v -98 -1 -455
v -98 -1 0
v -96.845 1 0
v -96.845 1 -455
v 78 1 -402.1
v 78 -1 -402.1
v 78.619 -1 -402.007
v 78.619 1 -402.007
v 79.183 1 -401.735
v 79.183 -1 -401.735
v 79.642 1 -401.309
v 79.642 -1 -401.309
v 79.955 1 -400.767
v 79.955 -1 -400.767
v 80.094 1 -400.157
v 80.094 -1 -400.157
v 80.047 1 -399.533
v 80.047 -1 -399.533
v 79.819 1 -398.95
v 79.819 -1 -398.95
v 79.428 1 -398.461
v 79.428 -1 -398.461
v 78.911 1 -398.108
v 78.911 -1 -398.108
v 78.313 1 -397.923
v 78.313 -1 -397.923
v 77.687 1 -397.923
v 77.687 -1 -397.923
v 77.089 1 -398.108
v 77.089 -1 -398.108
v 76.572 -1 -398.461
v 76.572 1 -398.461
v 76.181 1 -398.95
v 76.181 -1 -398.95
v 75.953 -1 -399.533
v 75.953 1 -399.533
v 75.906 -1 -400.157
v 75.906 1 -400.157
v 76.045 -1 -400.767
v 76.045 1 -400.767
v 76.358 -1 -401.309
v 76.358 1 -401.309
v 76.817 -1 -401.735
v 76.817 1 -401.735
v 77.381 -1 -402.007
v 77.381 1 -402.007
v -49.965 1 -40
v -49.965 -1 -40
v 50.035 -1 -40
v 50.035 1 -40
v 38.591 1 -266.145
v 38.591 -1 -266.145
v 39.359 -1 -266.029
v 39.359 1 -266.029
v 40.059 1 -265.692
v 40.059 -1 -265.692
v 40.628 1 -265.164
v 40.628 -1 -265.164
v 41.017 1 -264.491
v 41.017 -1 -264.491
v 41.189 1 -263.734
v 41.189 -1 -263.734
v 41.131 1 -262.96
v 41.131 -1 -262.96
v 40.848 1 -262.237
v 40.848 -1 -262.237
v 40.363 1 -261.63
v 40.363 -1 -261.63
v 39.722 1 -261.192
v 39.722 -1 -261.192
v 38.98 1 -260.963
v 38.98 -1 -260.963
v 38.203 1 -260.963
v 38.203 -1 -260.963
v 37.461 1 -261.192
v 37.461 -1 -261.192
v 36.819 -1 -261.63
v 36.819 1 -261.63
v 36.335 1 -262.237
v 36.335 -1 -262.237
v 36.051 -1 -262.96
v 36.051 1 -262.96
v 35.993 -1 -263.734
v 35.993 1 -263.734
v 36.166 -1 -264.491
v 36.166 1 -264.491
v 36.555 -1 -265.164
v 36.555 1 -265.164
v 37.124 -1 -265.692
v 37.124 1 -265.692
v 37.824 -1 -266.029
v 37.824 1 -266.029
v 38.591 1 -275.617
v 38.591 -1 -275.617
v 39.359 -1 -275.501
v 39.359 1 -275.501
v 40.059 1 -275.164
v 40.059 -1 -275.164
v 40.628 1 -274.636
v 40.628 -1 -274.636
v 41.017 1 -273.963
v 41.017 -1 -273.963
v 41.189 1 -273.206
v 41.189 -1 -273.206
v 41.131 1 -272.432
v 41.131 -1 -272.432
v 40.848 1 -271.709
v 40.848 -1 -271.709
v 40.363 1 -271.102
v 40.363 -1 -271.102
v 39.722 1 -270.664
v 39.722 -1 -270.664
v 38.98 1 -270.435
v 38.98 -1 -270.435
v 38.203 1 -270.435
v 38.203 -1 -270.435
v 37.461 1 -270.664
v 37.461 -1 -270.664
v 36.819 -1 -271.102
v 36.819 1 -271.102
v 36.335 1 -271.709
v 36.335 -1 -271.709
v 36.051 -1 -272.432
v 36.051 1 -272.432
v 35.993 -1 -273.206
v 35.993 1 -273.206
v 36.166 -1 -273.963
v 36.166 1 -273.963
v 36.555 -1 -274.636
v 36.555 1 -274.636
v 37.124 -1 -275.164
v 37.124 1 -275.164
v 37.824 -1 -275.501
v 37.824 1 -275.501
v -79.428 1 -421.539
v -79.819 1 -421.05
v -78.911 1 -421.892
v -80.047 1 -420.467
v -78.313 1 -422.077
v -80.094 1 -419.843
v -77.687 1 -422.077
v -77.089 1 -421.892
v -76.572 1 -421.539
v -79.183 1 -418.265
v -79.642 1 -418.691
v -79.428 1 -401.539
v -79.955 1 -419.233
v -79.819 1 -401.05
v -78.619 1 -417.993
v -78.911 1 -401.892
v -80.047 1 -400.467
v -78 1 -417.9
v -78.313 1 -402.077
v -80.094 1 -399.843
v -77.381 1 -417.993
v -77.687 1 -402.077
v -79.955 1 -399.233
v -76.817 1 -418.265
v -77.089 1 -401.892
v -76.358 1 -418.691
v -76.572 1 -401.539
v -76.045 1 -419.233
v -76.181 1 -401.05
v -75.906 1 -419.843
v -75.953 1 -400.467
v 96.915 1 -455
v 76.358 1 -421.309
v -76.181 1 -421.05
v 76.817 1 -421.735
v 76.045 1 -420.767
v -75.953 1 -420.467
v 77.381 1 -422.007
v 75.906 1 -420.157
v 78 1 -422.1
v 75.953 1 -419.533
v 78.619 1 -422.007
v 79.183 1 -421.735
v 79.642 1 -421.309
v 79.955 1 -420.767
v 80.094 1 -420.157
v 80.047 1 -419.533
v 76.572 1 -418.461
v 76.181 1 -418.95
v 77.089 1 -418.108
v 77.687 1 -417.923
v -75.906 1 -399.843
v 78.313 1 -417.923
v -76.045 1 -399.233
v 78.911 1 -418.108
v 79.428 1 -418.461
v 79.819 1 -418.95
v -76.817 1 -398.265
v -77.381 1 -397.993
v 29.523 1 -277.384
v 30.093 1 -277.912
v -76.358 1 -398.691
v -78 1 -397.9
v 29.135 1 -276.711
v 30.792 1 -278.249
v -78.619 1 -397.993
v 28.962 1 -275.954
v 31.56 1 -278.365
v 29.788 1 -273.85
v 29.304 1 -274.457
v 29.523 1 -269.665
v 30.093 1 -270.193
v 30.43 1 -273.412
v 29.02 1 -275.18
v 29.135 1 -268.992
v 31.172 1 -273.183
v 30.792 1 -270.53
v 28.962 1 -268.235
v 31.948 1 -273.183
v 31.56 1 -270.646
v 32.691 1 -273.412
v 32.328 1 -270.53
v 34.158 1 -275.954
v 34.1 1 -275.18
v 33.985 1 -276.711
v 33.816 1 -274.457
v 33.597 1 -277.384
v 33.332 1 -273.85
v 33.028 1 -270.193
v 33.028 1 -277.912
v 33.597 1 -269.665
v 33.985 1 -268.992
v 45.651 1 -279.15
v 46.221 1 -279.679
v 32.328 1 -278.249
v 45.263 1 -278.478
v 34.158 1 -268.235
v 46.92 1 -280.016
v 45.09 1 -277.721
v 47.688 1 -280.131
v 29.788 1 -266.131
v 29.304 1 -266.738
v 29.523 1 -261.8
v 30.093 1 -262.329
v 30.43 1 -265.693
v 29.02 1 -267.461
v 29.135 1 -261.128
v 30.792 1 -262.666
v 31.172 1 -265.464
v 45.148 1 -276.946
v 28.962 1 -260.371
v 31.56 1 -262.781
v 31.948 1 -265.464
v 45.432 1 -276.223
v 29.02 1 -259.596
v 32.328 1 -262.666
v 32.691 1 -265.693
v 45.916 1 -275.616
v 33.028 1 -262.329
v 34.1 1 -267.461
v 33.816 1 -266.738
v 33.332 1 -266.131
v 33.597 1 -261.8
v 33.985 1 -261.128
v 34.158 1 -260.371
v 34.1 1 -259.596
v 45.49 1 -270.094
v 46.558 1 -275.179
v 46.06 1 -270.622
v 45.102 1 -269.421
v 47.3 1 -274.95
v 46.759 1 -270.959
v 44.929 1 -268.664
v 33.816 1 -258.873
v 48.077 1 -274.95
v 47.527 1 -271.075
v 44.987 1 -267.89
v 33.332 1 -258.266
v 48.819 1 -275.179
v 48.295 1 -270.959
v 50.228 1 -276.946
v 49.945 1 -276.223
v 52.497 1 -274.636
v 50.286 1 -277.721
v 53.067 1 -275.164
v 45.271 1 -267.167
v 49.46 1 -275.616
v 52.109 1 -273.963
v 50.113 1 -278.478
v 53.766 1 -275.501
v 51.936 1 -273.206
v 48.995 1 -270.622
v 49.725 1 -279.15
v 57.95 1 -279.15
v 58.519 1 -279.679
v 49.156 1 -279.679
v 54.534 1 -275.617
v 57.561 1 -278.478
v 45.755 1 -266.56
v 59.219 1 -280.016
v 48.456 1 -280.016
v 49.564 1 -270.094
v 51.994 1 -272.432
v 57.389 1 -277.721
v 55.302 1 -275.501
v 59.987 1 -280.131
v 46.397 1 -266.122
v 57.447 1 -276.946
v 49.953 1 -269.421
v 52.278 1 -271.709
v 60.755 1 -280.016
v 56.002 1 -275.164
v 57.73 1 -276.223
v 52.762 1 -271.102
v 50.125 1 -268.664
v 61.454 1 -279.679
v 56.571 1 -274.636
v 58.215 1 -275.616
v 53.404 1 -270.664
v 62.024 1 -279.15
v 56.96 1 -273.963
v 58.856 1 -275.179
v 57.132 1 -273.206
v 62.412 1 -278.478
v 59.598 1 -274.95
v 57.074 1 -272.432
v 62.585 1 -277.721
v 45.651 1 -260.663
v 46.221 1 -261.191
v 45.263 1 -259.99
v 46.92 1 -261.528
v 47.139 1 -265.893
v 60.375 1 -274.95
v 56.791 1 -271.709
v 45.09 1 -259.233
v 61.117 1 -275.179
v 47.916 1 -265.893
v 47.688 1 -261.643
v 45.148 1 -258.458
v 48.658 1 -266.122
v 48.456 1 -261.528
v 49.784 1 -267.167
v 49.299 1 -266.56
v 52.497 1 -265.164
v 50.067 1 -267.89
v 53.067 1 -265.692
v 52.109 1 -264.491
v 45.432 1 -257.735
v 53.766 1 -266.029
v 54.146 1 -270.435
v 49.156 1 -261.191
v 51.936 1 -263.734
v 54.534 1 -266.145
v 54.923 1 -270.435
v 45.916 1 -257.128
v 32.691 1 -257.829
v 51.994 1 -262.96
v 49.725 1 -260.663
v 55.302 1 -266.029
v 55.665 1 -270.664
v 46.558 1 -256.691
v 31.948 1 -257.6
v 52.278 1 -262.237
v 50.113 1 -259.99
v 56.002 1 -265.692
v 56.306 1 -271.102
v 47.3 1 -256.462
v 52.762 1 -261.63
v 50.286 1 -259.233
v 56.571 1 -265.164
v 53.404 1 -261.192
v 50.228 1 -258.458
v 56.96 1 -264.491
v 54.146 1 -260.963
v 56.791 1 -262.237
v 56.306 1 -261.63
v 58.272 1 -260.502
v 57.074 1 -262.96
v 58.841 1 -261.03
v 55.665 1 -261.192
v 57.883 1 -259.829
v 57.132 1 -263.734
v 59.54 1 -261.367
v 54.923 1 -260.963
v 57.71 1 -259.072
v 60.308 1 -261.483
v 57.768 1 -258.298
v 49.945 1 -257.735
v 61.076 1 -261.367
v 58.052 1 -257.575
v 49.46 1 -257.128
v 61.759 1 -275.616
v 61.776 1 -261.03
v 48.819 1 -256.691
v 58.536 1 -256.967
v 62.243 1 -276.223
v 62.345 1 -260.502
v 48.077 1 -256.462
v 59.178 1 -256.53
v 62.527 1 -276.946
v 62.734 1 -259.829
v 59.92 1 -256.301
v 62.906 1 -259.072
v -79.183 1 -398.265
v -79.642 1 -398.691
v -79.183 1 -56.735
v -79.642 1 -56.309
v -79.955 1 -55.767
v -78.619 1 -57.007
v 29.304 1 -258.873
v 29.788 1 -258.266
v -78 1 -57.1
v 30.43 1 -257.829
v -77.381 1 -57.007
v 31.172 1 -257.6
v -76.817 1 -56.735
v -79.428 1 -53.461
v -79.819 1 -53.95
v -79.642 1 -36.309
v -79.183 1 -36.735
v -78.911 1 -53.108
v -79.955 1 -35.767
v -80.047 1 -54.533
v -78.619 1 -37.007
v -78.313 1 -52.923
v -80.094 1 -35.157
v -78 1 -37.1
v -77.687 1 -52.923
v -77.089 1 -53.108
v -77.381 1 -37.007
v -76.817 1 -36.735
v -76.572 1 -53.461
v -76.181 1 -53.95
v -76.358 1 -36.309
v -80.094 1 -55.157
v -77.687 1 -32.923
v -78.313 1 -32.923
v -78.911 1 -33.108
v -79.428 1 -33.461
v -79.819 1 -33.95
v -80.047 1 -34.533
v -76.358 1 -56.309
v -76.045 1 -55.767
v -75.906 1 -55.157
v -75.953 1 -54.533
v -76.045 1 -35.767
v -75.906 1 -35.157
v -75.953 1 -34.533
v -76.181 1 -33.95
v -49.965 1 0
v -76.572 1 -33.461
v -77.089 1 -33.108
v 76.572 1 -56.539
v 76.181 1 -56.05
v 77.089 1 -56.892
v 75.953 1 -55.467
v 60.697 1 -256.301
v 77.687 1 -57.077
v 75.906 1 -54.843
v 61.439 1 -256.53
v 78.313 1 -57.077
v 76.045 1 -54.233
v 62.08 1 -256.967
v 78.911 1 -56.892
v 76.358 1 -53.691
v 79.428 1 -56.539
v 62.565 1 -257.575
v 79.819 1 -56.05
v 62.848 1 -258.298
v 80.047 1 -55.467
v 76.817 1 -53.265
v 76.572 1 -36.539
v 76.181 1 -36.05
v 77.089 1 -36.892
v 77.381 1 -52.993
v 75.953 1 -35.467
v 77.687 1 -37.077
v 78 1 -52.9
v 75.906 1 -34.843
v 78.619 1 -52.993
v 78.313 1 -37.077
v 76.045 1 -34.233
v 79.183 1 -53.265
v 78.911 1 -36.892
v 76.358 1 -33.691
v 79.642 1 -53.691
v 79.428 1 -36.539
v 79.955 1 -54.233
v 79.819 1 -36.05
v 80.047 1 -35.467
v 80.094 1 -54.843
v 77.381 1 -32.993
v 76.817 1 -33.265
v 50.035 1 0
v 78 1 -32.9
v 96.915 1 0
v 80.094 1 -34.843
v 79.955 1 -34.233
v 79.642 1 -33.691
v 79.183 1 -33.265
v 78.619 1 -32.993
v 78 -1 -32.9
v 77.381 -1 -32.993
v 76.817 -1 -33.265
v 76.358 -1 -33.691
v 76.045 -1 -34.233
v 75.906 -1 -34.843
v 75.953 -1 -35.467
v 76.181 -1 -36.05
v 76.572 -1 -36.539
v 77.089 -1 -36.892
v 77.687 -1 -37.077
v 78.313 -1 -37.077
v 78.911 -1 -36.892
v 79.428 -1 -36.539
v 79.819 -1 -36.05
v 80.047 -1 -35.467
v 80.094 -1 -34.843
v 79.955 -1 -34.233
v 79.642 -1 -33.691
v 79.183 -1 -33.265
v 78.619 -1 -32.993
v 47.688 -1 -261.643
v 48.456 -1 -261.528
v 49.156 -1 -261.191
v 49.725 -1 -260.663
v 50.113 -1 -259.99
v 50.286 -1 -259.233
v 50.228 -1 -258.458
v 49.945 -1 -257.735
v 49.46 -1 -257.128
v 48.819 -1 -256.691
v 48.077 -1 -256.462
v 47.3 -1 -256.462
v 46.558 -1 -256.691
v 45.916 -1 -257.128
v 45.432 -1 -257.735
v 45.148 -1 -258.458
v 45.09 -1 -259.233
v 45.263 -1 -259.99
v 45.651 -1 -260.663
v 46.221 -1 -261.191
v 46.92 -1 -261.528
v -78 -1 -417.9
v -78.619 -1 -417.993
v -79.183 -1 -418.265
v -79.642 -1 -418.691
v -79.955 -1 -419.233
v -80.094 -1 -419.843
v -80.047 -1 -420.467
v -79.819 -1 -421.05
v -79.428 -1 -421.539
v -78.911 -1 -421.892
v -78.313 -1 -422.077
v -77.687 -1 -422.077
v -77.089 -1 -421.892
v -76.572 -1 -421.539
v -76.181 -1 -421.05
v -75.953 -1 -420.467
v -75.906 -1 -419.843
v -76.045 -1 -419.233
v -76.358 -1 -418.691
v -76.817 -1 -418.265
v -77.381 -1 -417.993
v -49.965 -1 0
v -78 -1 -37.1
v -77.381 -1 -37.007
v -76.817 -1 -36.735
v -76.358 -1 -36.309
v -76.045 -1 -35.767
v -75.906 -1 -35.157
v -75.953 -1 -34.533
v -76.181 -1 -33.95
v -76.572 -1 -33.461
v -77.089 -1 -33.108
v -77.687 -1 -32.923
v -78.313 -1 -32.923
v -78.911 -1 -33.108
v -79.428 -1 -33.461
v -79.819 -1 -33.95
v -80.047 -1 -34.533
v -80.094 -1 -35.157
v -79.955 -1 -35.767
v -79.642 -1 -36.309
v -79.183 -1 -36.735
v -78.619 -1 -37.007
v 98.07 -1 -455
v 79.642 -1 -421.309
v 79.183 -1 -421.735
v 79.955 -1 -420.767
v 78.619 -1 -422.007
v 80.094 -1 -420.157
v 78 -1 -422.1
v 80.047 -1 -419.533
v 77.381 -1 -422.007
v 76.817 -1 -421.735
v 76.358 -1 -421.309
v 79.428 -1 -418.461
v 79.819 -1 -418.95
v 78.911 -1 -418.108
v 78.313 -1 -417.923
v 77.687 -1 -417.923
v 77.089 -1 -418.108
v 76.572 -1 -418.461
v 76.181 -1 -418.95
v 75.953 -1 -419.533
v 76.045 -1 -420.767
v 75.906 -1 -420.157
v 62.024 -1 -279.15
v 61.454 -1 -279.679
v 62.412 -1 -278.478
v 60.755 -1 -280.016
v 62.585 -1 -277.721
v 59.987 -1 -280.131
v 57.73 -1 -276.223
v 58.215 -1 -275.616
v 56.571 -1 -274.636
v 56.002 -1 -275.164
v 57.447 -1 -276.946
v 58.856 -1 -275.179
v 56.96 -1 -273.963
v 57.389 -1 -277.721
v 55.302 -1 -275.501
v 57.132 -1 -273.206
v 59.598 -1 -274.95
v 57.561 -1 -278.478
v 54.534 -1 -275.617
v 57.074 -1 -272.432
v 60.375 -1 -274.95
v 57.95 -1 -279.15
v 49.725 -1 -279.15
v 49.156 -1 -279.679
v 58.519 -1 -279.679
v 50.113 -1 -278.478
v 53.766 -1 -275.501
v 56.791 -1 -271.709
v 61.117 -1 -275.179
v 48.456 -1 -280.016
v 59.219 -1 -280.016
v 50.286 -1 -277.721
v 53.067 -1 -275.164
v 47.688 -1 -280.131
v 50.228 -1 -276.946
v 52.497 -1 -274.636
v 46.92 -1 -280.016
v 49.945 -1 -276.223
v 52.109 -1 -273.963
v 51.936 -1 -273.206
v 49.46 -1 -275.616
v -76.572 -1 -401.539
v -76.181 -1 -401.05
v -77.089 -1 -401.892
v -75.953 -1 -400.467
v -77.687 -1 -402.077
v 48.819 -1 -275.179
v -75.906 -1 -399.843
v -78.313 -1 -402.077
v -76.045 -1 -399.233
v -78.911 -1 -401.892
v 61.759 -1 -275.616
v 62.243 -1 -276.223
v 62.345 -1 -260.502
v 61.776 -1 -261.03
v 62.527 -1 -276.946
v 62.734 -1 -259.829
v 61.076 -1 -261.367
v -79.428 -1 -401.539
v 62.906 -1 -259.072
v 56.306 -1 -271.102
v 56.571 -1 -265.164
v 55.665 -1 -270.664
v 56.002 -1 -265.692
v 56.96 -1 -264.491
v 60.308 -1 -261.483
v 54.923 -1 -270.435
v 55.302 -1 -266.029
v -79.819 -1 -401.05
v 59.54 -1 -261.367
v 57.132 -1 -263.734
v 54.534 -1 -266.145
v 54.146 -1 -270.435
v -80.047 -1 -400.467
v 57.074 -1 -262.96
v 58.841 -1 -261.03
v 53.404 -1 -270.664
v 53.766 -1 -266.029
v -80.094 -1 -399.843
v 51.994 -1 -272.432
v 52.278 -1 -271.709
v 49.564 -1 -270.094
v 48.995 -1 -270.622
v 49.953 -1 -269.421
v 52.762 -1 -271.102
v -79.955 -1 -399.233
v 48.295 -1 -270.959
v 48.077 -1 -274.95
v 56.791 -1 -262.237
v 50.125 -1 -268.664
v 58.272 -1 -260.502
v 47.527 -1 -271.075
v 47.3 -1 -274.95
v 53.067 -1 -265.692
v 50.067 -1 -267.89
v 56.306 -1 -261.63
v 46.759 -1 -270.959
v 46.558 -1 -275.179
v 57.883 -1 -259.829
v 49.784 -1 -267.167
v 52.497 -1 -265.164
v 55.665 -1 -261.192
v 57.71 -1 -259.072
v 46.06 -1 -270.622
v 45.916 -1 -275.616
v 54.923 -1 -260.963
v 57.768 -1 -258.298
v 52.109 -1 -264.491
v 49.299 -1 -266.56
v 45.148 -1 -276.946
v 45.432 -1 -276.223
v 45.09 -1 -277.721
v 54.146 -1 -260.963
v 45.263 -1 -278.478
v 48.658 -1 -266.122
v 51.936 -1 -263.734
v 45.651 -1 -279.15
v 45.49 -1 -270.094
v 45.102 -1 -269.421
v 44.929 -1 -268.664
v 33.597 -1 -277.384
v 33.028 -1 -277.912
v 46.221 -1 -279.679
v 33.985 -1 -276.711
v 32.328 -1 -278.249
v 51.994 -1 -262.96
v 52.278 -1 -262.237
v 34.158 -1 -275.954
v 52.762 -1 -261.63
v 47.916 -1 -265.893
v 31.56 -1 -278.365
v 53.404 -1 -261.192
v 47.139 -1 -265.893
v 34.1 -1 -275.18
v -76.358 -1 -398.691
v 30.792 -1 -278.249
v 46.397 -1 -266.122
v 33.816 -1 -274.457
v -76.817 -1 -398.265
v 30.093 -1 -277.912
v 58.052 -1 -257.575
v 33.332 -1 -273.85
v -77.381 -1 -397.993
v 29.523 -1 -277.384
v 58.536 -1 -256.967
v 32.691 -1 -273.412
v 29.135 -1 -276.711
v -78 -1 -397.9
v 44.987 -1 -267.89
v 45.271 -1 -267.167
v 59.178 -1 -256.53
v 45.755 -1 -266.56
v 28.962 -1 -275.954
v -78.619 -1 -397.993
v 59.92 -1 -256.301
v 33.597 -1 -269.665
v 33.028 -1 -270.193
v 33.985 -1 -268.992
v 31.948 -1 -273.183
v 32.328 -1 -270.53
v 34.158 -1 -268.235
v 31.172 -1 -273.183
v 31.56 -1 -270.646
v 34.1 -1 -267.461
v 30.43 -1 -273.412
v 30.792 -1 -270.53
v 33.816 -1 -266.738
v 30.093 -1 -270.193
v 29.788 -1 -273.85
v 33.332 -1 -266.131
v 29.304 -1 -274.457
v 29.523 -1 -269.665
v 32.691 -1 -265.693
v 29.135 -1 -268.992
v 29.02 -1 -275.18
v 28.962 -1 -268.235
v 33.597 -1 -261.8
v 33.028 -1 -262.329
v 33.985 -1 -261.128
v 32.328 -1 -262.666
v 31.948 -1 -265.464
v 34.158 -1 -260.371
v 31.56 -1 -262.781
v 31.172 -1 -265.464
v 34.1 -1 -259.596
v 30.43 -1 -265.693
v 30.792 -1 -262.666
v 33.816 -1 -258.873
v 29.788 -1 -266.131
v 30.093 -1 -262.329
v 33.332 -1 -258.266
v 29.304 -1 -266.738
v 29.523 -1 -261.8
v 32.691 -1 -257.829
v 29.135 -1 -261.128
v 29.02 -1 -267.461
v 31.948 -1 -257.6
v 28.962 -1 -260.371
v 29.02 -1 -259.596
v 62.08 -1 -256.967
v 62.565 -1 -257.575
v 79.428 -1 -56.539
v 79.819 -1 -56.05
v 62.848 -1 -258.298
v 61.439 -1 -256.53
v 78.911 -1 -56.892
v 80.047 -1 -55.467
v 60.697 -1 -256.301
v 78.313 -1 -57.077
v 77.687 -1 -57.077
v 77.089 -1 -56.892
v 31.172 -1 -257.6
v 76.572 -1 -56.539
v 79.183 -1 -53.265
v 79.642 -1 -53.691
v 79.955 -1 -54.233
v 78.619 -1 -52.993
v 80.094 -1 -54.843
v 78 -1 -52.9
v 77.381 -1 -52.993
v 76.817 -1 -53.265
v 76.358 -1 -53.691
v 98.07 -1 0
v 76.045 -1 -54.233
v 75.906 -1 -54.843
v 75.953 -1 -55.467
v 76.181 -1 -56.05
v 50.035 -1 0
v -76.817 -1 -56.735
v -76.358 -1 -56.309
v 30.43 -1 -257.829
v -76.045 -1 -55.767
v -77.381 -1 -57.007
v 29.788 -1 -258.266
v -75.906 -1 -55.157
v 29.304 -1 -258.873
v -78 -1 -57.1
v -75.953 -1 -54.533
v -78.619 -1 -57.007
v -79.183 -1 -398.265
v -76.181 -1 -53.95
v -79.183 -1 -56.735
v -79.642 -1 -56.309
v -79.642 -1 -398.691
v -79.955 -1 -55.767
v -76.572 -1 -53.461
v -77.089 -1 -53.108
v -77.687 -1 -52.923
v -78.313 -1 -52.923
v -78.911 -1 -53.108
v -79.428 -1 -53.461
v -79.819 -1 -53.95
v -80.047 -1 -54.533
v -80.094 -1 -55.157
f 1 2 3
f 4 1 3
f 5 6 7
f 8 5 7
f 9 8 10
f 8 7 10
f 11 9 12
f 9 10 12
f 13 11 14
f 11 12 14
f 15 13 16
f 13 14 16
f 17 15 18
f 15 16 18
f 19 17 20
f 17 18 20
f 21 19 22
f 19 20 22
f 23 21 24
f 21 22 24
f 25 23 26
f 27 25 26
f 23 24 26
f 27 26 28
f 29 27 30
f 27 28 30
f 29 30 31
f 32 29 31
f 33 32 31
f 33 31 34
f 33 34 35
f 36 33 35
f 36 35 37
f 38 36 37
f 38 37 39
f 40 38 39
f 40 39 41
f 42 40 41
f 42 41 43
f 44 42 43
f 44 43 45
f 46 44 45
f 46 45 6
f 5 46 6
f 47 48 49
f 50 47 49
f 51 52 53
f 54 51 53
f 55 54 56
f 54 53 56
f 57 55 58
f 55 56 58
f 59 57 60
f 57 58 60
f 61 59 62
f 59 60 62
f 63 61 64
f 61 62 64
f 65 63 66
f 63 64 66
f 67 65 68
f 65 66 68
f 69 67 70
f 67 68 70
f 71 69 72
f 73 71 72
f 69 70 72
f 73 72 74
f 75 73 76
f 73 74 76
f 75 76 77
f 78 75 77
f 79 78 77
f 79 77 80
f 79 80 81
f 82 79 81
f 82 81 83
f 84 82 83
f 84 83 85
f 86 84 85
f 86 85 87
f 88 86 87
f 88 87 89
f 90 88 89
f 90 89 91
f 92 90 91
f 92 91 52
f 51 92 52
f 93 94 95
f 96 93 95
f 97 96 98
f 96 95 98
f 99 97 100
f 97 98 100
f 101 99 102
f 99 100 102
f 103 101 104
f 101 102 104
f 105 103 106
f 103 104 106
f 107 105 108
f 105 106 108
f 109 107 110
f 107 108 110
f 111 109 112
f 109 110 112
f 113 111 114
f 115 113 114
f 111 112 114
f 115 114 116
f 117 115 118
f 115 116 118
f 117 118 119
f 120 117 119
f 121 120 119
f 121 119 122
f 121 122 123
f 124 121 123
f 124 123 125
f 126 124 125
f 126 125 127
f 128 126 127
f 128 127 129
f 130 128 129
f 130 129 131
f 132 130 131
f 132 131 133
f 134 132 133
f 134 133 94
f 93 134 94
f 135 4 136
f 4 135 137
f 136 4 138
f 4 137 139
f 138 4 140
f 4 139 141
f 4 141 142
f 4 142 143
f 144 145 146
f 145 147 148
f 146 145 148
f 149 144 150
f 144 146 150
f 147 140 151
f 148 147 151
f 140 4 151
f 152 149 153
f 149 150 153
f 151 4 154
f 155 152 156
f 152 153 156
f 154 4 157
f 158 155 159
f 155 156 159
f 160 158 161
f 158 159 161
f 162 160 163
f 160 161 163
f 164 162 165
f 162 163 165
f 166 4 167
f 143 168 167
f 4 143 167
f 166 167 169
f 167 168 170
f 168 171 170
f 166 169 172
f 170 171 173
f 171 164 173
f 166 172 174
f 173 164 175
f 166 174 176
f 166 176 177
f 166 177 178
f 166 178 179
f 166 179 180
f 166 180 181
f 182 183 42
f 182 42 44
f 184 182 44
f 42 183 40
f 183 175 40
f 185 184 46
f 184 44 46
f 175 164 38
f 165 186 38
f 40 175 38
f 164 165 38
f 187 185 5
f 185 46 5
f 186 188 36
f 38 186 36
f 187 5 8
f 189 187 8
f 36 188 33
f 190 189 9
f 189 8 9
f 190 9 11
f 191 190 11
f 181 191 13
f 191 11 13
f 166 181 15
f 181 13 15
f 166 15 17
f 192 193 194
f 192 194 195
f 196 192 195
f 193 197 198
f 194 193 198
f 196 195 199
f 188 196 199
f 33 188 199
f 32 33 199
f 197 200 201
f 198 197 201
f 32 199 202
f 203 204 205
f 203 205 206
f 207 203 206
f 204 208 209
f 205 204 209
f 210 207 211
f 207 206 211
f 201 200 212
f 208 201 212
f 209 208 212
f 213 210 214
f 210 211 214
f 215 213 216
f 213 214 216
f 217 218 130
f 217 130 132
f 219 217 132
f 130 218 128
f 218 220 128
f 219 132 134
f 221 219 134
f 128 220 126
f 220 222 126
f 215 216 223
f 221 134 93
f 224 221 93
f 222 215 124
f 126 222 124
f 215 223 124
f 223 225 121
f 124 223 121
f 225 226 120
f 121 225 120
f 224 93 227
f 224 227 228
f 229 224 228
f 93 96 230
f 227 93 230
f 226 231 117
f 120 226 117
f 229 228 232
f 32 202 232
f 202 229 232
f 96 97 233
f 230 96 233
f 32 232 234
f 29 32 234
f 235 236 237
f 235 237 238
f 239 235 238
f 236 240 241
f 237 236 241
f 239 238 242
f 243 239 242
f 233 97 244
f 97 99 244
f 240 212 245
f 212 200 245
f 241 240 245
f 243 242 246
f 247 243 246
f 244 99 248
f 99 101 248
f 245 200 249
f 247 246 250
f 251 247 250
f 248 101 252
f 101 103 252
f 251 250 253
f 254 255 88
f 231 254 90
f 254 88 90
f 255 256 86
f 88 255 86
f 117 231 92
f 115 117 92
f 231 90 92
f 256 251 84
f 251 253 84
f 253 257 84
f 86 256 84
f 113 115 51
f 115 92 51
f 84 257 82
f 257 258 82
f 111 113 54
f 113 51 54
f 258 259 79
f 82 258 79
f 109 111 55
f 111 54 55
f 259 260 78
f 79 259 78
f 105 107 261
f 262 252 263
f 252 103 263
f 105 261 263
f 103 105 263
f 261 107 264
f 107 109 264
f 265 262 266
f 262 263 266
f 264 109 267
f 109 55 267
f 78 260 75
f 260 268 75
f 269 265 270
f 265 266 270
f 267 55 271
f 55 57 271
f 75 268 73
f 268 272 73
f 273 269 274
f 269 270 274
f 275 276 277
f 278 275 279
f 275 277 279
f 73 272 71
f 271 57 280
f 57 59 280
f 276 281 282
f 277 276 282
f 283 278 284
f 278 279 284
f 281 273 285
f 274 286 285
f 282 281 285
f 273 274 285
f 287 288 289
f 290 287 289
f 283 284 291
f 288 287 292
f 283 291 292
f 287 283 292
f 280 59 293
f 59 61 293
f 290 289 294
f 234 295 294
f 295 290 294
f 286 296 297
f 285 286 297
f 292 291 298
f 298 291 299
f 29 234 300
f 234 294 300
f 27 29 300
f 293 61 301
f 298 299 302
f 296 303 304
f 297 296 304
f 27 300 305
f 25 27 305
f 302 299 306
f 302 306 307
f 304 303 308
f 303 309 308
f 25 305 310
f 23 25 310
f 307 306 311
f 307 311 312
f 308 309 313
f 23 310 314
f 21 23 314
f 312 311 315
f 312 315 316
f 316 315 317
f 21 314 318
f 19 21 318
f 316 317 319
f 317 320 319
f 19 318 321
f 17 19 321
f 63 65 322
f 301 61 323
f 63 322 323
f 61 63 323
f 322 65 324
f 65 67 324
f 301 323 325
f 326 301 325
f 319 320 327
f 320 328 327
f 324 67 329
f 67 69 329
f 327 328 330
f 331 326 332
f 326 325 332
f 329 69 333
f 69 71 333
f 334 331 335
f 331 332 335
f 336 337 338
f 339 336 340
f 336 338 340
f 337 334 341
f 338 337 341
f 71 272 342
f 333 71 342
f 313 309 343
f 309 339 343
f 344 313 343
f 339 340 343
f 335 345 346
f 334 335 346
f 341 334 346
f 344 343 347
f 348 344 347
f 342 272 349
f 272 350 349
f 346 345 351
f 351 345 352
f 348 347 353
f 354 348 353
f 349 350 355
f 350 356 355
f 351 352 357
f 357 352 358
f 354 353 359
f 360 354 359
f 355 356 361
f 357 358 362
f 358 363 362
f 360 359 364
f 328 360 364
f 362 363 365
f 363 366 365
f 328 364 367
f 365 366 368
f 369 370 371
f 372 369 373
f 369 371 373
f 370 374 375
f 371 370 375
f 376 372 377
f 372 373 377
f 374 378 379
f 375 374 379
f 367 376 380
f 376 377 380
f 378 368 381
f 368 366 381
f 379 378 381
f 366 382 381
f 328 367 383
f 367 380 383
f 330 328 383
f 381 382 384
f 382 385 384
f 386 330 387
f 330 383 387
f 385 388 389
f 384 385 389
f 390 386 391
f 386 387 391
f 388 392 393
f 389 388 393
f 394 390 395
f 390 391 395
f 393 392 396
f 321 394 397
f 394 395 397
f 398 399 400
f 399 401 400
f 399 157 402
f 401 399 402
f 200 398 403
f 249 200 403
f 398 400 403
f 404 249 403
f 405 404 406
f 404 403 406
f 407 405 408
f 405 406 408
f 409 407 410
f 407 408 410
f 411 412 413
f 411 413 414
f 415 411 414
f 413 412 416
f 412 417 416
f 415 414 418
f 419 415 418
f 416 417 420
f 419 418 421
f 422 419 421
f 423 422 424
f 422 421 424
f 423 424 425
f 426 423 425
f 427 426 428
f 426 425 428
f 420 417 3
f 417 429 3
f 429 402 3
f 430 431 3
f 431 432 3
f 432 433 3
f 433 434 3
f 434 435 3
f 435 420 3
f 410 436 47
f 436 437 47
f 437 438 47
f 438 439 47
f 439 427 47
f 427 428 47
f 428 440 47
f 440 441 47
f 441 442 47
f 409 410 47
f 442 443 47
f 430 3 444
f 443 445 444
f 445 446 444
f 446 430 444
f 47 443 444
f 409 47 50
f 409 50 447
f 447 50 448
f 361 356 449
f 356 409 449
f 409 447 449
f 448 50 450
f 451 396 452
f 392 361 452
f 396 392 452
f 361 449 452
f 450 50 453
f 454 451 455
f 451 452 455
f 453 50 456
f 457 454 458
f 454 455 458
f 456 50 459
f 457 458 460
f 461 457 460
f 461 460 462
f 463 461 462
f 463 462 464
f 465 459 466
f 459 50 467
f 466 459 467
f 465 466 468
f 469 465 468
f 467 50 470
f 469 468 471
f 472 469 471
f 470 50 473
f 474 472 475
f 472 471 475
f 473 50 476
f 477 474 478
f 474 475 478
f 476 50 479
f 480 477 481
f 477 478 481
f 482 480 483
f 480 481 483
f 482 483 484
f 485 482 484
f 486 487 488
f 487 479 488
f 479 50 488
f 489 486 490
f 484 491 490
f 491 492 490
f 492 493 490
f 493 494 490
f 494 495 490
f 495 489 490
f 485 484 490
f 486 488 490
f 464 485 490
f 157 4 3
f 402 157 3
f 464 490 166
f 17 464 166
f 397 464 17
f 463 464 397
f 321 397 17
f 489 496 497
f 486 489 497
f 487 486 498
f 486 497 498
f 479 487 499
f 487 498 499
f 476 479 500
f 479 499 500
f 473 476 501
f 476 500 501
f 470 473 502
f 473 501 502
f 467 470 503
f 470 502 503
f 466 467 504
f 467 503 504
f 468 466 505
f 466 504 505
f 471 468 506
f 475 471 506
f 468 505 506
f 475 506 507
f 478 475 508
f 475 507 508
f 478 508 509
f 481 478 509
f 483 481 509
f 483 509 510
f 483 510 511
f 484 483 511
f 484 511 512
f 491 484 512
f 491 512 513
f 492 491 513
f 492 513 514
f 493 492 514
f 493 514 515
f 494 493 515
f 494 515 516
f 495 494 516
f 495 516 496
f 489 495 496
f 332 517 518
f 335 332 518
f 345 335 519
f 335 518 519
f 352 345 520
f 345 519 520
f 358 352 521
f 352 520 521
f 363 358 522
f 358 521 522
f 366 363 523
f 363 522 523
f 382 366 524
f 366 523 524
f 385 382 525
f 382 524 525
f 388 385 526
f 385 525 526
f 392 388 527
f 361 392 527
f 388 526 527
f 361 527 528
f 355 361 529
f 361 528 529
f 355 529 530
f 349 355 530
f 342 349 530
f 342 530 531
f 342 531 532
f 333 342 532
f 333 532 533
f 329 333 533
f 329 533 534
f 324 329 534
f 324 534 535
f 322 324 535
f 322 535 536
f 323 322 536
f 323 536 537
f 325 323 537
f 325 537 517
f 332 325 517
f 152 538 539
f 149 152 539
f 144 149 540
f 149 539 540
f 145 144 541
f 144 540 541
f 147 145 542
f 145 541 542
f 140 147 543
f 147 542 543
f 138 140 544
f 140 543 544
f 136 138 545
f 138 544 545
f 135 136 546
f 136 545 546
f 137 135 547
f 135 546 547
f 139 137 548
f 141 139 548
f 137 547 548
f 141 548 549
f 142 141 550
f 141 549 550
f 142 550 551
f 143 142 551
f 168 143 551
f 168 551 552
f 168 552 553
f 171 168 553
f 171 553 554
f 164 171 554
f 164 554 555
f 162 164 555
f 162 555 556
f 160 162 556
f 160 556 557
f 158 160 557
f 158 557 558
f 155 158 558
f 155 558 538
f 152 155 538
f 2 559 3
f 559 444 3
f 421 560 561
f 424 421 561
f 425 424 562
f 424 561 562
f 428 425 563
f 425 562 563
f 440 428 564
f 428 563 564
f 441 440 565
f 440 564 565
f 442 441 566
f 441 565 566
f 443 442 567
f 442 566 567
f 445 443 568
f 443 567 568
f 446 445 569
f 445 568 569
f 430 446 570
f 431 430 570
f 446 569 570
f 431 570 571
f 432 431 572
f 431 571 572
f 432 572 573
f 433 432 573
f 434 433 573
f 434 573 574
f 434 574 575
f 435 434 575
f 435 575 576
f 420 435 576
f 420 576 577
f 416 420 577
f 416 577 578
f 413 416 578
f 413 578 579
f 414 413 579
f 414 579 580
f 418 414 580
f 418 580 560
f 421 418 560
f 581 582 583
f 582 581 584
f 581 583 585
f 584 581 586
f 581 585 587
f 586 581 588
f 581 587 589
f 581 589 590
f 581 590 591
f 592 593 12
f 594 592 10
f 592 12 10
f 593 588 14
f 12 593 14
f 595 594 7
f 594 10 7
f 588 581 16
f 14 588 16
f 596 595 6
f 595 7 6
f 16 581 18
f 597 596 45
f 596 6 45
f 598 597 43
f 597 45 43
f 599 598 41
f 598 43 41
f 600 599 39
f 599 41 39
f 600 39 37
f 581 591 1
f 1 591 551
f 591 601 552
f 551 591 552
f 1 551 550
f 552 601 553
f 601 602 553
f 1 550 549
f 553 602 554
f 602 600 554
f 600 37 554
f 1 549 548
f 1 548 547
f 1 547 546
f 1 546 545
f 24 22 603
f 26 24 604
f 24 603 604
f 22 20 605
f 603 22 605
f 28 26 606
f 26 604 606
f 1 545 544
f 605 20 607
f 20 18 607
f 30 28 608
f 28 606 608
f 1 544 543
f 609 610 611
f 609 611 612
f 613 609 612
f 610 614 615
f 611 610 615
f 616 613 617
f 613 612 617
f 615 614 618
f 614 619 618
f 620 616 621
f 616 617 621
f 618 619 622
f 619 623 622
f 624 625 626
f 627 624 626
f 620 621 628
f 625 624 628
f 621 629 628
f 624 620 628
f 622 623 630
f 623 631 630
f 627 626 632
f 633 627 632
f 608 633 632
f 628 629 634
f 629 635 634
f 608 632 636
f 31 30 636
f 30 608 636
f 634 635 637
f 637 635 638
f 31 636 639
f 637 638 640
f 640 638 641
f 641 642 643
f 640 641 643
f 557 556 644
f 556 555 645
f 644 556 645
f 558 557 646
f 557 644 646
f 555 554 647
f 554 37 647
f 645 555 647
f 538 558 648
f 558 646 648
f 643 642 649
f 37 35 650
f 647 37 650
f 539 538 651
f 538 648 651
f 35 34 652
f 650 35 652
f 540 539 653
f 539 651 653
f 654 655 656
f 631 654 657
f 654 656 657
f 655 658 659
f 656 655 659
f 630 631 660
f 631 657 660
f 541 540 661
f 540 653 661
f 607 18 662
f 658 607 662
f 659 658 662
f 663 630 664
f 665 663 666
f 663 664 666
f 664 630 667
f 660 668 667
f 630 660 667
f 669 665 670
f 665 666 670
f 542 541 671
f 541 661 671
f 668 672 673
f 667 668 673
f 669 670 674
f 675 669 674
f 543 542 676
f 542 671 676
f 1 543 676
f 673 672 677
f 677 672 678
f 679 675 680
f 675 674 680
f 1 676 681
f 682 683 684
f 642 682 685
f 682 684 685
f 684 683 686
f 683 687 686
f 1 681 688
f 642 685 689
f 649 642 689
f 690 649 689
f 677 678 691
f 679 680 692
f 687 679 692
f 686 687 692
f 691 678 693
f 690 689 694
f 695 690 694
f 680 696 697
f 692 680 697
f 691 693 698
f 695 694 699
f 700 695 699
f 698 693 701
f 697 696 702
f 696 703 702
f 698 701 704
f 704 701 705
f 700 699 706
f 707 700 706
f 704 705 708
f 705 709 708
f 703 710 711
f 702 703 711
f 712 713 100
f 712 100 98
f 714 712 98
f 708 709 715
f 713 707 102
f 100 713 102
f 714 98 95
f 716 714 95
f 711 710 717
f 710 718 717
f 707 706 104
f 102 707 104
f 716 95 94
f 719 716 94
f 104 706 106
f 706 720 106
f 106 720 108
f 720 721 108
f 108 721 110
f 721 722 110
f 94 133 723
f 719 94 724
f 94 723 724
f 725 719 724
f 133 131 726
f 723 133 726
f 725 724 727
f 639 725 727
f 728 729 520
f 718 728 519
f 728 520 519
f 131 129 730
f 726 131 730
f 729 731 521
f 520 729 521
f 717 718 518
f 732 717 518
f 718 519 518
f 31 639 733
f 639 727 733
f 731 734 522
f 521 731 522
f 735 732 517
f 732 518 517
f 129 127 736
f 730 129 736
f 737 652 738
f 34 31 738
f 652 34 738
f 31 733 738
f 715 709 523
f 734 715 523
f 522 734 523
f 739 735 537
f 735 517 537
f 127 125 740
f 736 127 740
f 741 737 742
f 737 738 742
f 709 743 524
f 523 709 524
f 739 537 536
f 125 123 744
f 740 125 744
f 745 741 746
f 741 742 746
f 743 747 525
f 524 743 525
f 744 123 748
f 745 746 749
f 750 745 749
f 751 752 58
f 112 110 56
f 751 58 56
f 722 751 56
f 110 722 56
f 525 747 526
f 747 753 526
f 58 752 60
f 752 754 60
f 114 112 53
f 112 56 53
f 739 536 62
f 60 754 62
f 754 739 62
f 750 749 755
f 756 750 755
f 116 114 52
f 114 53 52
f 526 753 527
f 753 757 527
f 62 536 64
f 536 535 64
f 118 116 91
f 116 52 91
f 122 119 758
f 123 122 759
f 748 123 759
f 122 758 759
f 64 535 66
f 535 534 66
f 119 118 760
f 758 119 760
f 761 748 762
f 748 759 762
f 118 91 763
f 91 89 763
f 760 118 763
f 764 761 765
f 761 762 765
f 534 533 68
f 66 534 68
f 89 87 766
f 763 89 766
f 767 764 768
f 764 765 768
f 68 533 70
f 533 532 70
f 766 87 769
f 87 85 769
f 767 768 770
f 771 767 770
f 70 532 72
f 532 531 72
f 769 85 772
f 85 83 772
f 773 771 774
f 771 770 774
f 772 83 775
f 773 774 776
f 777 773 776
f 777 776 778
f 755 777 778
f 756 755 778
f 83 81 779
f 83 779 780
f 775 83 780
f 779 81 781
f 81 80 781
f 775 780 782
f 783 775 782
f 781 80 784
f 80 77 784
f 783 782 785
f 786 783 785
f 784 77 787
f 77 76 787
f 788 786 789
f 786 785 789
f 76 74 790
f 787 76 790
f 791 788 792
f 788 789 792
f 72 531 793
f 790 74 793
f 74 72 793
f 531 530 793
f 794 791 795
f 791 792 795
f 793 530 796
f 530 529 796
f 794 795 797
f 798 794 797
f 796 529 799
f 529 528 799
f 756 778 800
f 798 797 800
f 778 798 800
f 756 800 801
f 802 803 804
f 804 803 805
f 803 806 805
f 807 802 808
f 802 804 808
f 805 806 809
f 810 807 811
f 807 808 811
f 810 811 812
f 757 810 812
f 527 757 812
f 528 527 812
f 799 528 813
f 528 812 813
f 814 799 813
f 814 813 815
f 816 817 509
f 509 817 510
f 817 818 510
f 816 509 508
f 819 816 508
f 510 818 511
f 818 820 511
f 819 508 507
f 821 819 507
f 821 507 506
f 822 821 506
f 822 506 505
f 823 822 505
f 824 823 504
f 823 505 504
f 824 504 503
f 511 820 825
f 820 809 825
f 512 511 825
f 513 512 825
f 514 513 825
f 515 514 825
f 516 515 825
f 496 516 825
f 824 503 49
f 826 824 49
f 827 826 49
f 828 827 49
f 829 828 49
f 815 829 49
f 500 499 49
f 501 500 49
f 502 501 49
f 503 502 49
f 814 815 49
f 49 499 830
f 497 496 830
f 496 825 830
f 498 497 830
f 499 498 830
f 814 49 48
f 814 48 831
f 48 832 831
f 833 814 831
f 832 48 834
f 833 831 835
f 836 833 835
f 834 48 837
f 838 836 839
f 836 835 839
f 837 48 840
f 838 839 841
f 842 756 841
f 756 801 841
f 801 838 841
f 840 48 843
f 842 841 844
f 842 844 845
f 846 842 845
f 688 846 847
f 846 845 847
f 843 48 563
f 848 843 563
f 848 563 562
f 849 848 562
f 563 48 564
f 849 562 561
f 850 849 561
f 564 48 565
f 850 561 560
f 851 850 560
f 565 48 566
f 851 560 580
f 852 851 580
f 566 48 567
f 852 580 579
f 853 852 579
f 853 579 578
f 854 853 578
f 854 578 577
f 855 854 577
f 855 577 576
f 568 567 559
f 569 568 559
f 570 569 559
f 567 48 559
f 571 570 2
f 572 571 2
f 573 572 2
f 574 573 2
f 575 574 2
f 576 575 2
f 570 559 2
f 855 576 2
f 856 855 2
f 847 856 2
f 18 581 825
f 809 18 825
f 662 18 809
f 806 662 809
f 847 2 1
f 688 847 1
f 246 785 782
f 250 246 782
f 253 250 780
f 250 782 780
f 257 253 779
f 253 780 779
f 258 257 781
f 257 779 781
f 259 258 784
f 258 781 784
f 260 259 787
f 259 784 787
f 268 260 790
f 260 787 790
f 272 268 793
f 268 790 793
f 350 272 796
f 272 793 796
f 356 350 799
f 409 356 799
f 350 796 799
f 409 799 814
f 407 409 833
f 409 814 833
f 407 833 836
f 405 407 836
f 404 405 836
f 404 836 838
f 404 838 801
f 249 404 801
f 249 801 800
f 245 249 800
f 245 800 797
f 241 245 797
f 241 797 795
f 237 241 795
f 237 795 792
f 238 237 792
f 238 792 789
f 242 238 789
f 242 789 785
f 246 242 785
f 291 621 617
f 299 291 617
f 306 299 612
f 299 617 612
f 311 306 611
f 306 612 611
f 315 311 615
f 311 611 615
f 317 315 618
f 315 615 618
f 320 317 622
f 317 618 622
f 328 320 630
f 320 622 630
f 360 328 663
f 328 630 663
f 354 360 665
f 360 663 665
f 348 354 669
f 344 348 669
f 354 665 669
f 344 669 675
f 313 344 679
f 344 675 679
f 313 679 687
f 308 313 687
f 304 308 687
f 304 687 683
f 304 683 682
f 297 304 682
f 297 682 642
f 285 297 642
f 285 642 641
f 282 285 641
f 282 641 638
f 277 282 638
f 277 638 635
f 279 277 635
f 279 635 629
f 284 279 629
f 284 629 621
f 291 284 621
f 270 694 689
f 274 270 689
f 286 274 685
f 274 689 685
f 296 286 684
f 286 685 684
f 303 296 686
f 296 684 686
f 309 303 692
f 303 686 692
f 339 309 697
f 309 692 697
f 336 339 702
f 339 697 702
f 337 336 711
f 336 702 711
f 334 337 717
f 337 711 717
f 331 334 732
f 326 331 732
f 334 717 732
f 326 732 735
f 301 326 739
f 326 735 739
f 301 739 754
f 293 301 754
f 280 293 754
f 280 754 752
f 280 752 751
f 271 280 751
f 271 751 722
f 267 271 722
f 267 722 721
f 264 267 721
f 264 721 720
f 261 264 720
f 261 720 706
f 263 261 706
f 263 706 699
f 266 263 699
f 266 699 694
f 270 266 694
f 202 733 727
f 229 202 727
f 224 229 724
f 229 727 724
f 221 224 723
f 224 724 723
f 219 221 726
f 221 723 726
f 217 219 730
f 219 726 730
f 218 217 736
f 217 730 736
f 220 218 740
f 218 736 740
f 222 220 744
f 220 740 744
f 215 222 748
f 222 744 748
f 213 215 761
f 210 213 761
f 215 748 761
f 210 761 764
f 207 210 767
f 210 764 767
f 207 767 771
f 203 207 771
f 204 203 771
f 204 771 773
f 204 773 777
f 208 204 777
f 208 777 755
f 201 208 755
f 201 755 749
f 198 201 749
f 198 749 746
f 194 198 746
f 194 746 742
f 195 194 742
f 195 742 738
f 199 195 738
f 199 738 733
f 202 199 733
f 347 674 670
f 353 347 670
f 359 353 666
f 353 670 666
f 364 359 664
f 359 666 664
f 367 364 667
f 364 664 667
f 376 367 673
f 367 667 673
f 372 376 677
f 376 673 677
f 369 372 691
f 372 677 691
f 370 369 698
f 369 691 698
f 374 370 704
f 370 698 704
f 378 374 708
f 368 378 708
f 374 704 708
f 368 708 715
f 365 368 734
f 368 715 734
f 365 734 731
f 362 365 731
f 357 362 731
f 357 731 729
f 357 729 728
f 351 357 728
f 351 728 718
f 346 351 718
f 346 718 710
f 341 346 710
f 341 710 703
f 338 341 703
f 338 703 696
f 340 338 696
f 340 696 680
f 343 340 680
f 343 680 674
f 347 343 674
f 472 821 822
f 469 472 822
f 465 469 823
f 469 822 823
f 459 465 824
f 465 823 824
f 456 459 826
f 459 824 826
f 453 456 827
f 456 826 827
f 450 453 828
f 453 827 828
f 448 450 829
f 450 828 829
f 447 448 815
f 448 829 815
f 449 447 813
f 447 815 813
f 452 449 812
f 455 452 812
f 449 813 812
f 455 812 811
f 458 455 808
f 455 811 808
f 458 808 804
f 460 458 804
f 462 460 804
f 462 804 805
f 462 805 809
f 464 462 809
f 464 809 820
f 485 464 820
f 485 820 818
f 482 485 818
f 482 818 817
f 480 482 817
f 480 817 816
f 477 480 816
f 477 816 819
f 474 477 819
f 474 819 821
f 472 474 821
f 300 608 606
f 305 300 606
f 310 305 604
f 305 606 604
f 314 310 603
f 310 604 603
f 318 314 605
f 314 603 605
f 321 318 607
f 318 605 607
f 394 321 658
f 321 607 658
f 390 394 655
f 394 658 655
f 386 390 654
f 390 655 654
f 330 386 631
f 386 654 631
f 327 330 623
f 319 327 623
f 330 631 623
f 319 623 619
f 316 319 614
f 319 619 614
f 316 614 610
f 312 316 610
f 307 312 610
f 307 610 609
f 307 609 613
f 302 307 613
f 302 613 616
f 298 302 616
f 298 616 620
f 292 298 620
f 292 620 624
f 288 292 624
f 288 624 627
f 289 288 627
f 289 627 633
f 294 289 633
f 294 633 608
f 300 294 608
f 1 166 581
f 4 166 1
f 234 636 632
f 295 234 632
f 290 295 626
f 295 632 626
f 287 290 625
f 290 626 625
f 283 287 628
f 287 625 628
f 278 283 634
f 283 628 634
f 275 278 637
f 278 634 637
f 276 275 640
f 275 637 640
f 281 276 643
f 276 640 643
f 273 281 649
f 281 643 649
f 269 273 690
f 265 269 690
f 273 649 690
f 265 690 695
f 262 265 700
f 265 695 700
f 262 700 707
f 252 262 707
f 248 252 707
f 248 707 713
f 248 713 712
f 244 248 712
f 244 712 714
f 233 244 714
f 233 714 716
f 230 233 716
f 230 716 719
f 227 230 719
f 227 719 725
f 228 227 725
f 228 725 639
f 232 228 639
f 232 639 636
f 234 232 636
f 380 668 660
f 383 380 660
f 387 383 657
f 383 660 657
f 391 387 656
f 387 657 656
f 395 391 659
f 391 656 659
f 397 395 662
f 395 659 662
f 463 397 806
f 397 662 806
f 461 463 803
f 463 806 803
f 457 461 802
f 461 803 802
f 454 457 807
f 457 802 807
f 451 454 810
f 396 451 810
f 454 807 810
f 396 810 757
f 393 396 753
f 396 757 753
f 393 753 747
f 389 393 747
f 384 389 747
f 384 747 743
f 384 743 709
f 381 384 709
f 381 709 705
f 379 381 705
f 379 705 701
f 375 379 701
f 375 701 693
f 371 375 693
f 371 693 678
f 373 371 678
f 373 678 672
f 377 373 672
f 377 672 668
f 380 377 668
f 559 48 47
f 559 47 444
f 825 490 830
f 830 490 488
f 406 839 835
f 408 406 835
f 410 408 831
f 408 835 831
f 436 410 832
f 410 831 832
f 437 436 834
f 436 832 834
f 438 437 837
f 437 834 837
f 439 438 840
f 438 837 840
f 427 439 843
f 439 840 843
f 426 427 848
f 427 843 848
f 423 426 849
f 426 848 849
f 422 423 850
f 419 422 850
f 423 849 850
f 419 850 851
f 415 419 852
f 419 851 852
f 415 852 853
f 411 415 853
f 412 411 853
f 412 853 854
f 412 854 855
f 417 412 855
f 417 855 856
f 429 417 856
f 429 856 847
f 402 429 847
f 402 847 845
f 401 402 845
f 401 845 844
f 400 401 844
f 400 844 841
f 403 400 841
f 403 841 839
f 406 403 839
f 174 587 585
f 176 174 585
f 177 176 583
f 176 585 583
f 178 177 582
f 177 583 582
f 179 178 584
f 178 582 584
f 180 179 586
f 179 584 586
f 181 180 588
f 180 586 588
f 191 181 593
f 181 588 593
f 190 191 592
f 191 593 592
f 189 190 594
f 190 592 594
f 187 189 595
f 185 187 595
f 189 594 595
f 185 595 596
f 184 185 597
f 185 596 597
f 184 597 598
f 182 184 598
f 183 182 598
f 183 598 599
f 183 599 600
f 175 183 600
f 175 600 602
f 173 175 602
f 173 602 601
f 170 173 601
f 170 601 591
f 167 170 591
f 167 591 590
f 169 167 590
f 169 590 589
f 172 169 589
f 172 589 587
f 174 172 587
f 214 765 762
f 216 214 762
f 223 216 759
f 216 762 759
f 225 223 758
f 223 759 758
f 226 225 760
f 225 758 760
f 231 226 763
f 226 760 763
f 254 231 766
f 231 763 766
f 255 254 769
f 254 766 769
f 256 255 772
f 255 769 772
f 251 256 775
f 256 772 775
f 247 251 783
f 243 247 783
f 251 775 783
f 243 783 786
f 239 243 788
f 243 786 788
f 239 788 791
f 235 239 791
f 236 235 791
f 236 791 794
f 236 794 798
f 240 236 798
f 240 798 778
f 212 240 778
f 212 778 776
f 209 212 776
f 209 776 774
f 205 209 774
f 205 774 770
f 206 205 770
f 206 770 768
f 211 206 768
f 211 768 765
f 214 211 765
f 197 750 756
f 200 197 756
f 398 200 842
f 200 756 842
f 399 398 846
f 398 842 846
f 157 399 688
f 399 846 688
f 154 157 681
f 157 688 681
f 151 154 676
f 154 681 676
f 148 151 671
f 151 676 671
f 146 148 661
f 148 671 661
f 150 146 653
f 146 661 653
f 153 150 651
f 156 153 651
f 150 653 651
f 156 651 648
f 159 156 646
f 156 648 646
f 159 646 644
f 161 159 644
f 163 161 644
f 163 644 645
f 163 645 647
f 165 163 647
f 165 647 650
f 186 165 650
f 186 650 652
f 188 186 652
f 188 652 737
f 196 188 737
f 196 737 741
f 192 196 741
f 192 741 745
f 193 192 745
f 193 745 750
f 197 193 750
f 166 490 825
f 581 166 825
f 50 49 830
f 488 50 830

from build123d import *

# Parameters (mm, degrees)
EXTRUDE_1_DEPTH     = 455
SKETCH_3_R          = 2.1
CUT_EXTRUDE_1_DEPTH = 466.453246739
SKETCH_4_W          = 100
SKETCH_4_H          = 40
CUT_EXTRUDE_2_DEPTH = 466.453246739
SKETCH_5_R          = 2.605282574
CUT_EXTRUDE_3_DEPTH = 466.453246739


with BuildPart() as part:
    # 草图2 → 凸台-拉伸1 (new body)
    with BuildSketch(Plane.XY):
        Polygon((-98, -1), (-96.845299462, 1), (96.915299462, 1), (98.07, -1), align=None)
    extrude(amount=-EXTRUDE_1_DEPTH)

    # 草图3 → 切除-拉伸1 (cut, through all)
    with BuildSketch(Plane(origin=(0, -1, 0), x_dir=(-1, 0, 0), z_dir=(0, -1, 0))):
        with Locations(Location((78, 35, 0), (0, 0, 90))):
            Circle(SKETCH_3_R)
        with Locations(Location((78, 55, 0), (0, 0, 90))):
            Circle(SKETCH_3_R)
        with Locations(Location((-78, 55, 0), (0, 0, 270))):
            Circle(SKETCH_3_R)
        with Locations(Location((-78, 35, 0), (0, 0, 270))):
            Circle(SKETCH_3_R)
        with Locations(Location((-78, 420, 0), (0, 0, 90))):
            Circle(SKETCH_3_R)
        with Locations(Location((-78, 400, 0), (0, 0, 90))):
            Circle(SKETCH_3_R)
        with Locations(Location((78, 400, 0), (0, 0, 270))):
            Circle(SKETCH_3_R)
        with Locations(Location((78, 420, 0), (0, 0, 270))):
            Circle(SKETCH_3_R)
    extrude(amount=-CUT_EXTRUDE_1_DEPTH, mode=Mode.SUBTRACT)

    # 草图4 → 切除-拉伸2 (cut, through all)
    with BuildSketch(Plane.XZ.offset(1)):
        with Locations((0.035, -20)):
            Rectangle(SKETCH_4_W, SKETCH_4_H)
    extrude(amount=-CUT_EXTRUDE_2_DEPTH, mode=Mode.SUBTRACT)

    # 草图5 → 切除-拉伸3 (cut, through all)
    with BuildSketch(Plane.XZ.offset(1)):
        with Locations(Location((31.560145964, -260.175968549, 0), (0, 0, 270))):
            Circle(SKETCH_5_R)
        with Locations(Location((31.560145964, -268.040513613, 0), (0, 0, 270))):
            Circle(SKETCH_5_R)
        with Locations(Location((31.560145964, -275.759418954, 0), (0, 0, 270))):
            Circle(SKETCH_5_R)
        with Locations(Location((38.591431537, -263.539657654, 0), (0, 0, 270))):
            Circle(SKETCH_5_R)
        with Locations(Location((38.591431537, -273.011612977, 0), (0, 0, 270))):
            Circle(SKETCH_5_R)
        with Locations(Location((47.527390385, -268.469499033, 0), (0, 0, 270))):
            Circle(SKETCH_5_R)
        with Locations(Location((54.534326635, -263.539657654, 0), (0, 0, 270))):
            Circle(SKETCH_5_R)
        with Locations(Location((54.534326635, -273.011612977, 0), (0, 0, 270))):
            Circle(SKETCH_5_R)
        with Locations(Location((47.688259917, -277.526130321, 0), (0, 0, 270))):
            Circle(SKETCH_5_R)
        with Locations(Location((47.688259917, -259.038134333, 0), (0, 0, 270))):
            Circle(SKETCH_5_R)
        with Locations(Location((60.308400403, -258.8772648, 0), (0, 0, 270))):
            Circle(SKETCH_5_R)
        with Locations(Location((59.986661338, -277.526130321, 0), (0, 0, 270))):
            Circle(SKETCH_5_R)
    extrude(amount=-CUT_EXTRUDE_3_DEPTH, mode=Mode.SUBTRACT)


solid = part.part
